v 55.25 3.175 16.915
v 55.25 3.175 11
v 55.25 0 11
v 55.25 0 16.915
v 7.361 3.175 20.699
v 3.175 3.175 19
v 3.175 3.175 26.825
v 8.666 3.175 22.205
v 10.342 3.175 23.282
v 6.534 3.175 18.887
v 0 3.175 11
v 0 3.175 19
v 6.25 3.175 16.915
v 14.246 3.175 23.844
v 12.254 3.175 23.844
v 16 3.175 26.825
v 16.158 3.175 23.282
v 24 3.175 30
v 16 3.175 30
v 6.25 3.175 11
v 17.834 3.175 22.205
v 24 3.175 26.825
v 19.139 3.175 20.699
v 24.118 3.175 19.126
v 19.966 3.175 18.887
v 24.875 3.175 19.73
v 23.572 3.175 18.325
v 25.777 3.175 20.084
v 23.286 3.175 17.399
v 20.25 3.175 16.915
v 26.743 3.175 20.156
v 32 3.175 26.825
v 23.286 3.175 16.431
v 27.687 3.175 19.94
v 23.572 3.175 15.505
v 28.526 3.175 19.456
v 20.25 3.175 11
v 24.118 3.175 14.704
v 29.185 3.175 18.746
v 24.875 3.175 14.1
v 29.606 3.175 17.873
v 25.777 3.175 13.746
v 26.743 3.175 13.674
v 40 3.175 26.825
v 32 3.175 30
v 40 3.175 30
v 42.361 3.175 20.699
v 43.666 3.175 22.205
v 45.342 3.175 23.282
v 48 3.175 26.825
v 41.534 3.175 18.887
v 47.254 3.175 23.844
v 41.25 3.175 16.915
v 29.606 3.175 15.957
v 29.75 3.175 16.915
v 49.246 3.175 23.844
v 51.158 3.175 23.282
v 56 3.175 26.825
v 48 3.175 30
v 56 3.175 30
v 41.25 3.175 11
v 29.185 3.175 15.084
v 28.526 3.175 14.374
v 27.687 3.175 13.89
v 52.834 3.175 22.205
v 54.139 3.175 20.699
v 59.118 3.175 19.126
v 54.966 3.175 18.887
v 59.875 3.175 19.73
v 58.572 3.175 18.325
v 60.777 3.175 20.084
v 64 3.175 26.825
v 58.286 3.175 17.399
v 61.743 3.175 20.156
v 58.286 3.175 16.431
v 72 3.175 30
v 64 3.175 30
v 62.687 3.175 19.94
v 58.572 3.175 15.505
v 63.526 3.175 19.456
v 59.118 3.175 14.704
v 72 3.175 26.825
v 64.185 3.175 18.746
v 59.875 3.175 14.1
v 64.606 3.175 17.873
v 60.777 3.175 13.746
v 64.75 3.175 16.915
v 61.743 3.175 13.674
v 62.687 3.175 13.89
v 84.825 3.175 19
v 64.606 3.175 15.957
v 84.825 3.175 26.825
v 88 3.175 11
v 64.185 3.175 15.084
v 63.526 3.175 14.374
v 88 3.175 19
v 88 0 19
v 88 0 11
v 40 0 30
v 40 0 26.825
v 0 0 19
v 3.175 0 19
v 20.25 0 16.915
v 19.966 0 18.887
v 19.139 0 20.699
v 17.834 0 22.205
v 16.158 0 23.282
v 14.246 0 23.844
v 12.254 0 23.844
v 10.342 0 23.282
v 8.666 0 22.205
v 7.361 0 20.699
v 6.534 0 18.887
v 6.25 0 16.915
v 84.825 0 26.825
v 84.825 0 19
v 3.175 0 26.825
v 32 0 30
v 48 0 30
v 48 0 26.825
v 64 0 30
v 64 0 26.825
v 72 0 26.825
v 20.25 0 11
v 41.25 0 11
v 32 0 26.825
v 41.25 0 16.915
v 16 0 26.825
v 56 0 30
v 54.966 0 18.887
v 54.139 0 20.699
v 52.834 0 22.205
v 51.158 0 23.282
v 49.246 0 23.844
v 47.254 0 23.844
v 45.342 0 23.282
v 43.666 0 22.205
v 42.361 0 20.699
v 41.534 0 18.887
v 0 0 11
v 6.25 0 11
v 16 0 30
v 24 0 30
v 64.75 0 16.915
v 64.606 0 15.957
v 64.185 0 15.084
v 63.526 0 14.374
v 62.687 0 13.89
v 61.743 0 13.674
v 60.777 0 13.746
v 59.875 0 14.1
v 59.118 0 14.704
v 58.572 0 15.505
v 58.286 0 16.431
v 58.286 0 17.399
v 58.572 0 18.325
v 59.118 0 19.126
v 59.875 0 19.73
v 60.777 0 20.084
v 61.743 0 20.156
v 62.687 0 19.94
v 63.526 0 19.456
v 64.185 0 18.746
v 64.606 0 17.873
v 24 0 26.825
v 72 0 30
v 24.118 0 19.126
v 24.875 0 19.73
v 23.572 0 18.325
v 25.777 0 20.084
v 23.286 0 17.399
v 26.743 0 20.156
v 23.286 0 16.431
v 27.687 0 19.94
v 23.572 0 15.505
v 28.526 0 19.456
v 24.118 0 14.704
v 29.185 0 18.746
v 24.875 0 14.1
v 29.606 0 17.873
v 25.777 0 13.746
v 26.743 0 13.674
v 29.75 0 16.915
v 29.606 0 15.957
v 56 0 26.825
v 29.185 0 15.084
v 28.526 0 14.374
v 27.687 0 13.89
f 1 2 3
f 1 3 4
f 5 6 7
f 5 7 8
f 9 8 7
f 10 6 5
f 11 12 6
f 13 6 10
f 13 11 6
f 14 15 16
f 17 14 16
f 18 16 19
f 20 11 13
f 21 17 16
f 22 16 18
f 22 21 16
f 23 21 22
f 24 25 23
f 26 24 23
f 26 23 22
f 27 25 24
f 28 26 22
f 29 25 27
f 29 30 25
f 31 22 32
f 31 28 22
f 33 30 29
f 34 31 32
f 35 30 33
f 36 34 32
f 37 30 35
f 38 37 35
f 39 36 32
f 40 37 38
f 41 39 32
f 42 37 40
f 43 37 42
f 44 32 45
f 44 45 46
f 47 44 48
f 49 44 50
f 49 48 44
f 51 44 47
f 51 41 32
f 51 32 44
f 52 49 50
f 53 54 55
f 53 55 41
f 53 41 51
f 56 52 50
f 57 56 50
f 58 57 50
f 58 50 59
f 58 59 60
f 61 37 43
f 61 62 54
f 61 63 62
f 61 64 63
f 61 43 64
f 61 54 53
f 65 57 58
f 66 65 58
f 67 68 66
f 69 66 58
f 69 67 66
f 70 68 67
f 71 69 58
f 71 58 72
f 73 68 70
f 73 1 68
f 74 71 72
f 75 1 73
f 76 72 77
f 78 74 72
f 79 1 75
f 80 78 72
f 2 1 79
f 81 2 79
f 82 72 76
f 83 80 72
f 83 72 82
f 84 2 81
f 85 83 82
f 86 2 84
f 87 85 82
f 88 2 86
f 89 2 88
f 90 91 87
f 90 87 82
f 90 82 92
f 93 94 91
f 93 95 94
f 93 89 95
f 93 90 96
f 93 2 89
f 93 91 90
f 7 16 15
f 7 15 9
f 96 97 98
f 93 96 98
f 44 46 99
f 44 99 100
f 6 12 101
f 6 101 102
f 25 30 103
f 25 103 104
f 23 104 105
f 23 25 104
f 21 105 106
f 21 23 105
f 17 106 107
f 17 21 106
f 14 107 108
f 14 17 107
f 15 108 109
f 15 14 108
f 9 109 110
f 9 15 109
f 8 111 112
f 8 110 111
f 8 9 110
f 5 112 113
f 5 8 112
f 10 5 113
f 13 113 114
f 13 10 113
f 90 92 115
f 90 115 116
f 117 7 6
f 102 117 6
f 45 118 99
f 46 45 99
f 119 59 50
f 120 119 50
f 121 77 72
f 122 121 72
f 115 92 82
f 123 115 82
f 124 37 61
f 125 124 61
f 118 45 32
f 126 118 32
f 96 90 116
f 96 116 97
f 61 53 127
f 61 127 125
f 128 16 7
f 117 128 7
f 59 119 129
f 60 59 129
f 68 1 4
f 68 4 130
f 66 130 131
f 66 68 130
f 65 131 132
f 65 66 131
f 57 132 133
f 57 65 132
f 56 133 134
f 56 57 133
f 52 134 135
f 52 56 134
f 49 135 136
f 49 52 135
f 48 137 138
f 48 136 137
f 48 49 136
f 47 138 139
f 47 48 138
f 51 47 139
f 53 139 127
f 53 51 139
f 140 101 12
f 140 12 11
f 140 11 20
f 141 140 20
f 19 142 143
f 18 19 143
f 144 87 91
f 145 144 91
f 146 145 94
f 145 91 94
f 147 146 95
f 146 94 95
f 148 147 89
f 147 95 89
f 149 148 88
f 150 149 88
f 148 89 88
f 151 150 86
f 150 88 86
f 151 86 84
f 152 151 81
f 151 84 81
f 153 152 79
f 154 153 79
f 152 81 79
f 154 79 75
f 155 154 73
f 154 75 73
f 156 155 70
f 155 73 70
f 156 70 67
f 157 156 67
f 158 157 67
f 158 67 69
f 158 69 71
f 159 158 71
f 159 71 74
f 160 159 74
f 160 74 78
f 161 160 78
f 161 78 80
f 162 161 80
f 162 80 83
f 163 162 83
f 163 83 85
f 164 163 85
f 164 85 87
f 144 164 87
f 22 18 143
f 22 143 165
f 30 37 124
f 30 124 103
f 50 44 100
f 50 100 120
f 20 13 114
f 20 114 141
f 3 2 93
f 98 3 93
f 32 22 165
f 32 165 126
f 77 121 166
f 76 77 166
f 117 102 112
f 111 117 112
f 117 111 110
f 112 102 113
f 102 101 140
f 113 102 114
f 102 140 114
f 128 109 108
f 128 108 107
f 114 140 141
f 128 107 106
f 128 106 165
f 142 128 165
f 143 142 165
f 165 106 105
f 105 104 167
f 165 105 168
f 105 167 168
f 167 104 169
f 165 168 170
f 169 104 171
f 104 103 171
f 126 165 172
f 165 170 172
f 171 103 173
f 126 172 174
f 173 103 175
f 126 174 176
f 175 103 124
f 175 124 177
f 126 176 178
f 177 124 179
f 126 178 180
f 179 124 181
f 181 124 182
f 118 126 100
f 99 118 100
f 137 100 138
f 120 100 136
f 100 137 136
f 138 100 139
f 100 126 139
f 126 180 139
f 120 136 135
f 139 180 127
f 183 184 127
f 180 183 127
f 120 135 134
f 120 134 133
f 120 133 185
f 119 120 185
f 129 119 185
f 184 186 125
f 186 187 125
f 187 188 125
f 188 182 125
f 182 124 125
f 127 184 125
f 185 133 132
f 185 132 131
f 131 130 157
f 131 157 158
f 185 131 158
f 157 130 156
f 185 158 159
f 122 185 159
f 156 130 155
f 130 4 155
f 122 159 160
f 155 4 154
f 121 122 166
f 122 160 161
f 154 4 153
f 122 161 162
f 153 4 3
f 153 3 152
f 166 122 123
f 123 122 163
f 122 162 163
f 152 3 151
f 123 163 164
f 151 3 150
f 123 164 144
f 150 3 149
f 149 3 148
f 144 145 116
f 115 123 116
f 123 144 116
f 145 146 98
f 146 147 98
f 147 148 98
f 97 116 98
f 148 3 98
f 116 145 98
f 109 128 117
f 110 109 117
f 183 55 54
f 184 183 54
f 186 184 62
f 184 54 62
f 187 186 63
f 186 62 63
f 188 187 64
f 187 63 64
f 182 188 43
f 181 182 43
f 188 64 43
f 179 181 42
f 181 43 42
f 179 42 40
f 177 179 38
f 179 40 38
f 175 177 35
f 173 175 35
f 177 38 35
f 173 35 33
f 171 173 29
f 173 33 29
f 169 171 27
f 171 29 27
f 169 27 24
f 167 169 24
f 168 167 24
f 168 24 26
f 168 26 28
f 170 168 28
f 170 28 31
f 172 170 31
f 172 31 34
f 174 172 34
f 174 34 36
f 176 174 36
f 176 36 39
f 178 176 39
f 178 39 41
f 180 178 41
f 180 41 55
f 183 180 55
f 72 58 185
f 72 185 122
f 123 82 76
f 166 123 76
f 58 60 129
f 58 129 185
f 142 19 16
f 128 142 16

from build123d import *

# Parameters (mm, degrees)
SKETCH3_W           = 88
SKETCH3_H           = 30
BOSS_EXTRUDE1_DEPTH = 3.175
CUT_EXTRUDE1_REACH  = 5.175
SKETCH4_W           = 3.175
SKETCH4_H           = 7.825
SKETCH4_W_2         = 8
SKETCH4_H_2         = 3.175
SKETCH4_H_3         = 11
CUT_EXTRUDE2_REACH  = 5.175
SKETCH5_R           = 3.25
CUT_EXTRUDE3_REACH  = 5.175
SKETCH6_W           = 81.65
SKETCH6_H           = 11
CUT_EXTRUDE4_REACH  = 5.175


with BuildPart() as part:
    # Sketch3 → Boss-Extrude1 (new body)
    with BuildSketch(Plane(origin=(0, 0, 0), x_dir=(1, 0, 0), z_dir=(0, 1, 0))):
        with Locations((44, -15)):
            Rectangle(SKETCH3_W, SKETCH3_H)
    extrude(amount=BOSS_EXTRUDE1_DEPTH)

    # Sketch4 → Cut-Extrude1 (cut, up to next)
    with BuildSketch(Plane(origin=(0, 3.175, 0), x_dir=(1, 0, 0), z_dir=(0, 1, 0)), mode=Mode.PRIVATE) as cut_extrude1_sk1:
        with Locations((1.5875, -22.9125)):
            Rectangle(SKETCH4_W, SKETCH4_H)
    cut_extrude1_tool1 = extrude(cut_extrude1_sk1.sketch, amount=-CUT_EXTRUDE1_REACH, mode=Mode.PRIVATE) & part.part
    add(cut_extrude1_tool1.solids().sort_by_distance((1.5875, 3.175, 22.9125))[0], mode=Mode.SUBTRACT)
    # Sketch4 → Cut-Extrude1 (cut, up to next)
    with BuildSketch(Plane(origin=(0, 3.175, 0), x_dir=(1, 0, 0), z_dir=(0, 1, 0)), mode=Mode.PRIVATE) as cut_extrude1_sk2:
        Polygon((0, -30), (16, -30), (16, -26.825), (3.175, -26.825), (0, -26.825), align=None)
    cut_extrude1_tool2 = extrude(cut_extrude1_sk2.sketch, amount=-CUT_EXTRUDE1_REACH, mode=Mode.PRIVATE) & part.part
    add(cut_extrude1_tool2.solids().sort_by_distance((8, 3.175, 28.4125))[0], mode=Mode.SUBTRACT)
    # Sketch4 → Cut-Extrude1 (cut, up to next)
    with BuildSketch(Plane(origin=(0, 3.175, 0), x_dir=(1, 0, 0), z_dir=(0, 1, 0)), mode=Mode.PRIVATE) as cut_extrude1_sk3:
        with Locations((28, -28.4125)):
            Rectangle(SKETCH4_W_2, SKETCH4_H_2)
    cut_extrude1_tool3 = extrude(cut_extrude1_sk3.sketch, amount=-CUT_EXTRUDE1_REACH, mode=Mode.PRIVATE) & part.part
    add(cut_extrude1_tool3.solids().sort_by_distance((28, 3.175, 28.4125))[0], mode=Mode.SUBTRACT)
    # Sketch4 → Cut-Extrude1 (cut, up to next)
    with BuildSketch(Plane(origin=(0, 3.175, 0), x_dir=(1, 0, 0), z_dir=(0, 1, 0)), mode=Mode.PRIVATE) as cut_extrude1_sk4:
        with Locations((44, -28.4125)):
            Rectangle(SKETCH4_W_2, SKETCH4_H_2)
    cut_extrude1_tool4 = extrude(cut_extrude1_sk4.sketch, amount=-CUT_EXTRUDE1_REACH, mode=Mode.PRIVATE) & part.part
    add(cut_extrude1_tool4.solids().sort_by_distance((44, 3.175, 28.4125))[0], mode=Mode.SUBTRACT)
    # Sketch4 → Cut-Extrude1 (cut, up to next)
    with BuildSketch(Plane(origin=(0, 3.175, 0), x_dir=(1, 0, 0), z_dir=(0, 1, 0)), mode=Mode.PRIVATE) as cut_extrude1_sk5:
        with Locations((60, -28.4125)):
            Rectangle(SKETCH4_W_2, SKETCH4_H_2)
    cut_extrude1_tool5 = extrude(cut_extrude1_sk5.sketch, amount=-CUT_EXTRUDE1_REACH, mode=Mode.PRIVATE) & part.part
    add(cut_extrude1_tool5.solids().sort_by_distance((60, 3.175, 28.4125))[0], mode=Mode.SUBTRACT)
    # Sketch4 → Cut-Extrude1 (cut, up to next)
    with BuildSketch(Plane(origin=(0, 3.175, 0), x_dir=(1, 0, 0), z_dir=(0, 1, 0)), mode=Mode.PRIVATE) as cut_extrude1_sk6:
        with Locations((86.4125, -22.9125)):
            Rectangle(SKETCH4_W, SKETCH4_H)
    cut_extrude1_tool6 = extrude(cut_extrude1_sk6.sketch, amount=-CUT_EXTRUDE1_REACH, mode=Mode.PRIVATE) & part.part
    add(cut_extrude1_tool6.solids().sort_by_distance((86.4125, 3.175, 22.9125))[0], mode=Mode.SUBTRACT)
    # Sketch4 → Cut-Extrude1 (cut, up to next)
    with BuildSketch(Plane(origin=(0, 3.175, 0), x_dir=(1, 0, 0), z_dir=(0, 1, 0)), mode=Mode.PRIVATE) as cut_extrude1_sk7:
        with Locations((86.4125, -5.5)):
            Rectangle(SKETCH4_W, SKETCH4_H_3)
    cut_extrude1_tool7 = extrude(cut_extrude1_sk7.sketch, amount=-CUT_EXTRUDE1_REACH, mode=Mode.PRIVATE) & part.part
    add(cut_extrude1_tool7.solids().sort_by_distance((86.4125, 3.175, 5.5))[0], mode=Mode.SUBTRACT)
    # Sketch4 → Cut-Extrude1 (cut, up to next)
    with BuildSketch(Plane(origin=(0, 3.175, 0), x_dir=(1, 0, 0), z_dir=(0, 1, 0)), mode=Mode.PRIVATE) as cut_extrude1_sk8:
        Polygon((72, -26.825), (72, -30), (88, -30), (88, -26.825), (84.825, -26.825), align=None)
    cut_extrude1_tool8 = extrude(cut_extrude1_sk8.sketch, amount=-CUT_EXTRUDE1_REACH, mode=Mode.PRIVATE) & part.part
    add(cut_extrude1_tool8.solids().sort_by_distance((80, 3.175, 28.4125))[0], mode=Mode.SUBTRACT)
    # Sketch4 → Cut-Extrude1 (cut, up to next)
    with BuildSketch(Plane(origin=(0, 3.175, 0), x_dir=(1, 0, 0), z_dir=(0, 1, 0)), mode=Mode.PRIVATE) as cut_extrude1_sk9:
        with Locations((1.5875, -5.5)):
            Rectangle(SKETCH4_W, SKETCH4_H_3)
    cut_extrude1_tool9 = extrude(cut_extrude1_sk9.sketch, amount=-CUT_EXTRUDE1_REACH, mode=Mode.PRIVATE) & part.part
    add(cut_extrude1_tool9.solids().sort_by_distance((1.5875, 3.175, 5.5))[0], mode=Mode.SUBTRACT)

    # Sketch5 → Cut-Extrude2 (cut, up to next)
    with BuildSketch(Plane(origin=(0, 3.175, 0), x_dir=(1, 0, 0), z_dir=(0, 1, 0)), mode=Mode.PRIVATE) as cut_extrude2_sk1:
        with Locations((61.5, -16.915)):
            Circle(SKETCH5_R)
    cut_extrude2_tool1 = extrude(cut_extrude2_sk1.sketch, amount=-CUT_EXTRUDE2_REACH, mode=Mode.PRIVATE) & part.part
    add(cut_extrude2_tool1.solids().sort_by_distance((61.5, 3.175, 16.915))[0], mode=Mode.SUBTRACT)
    # Sketch5 → Cut-Extrude2 (cut, up to next)
    with BuildSketch(Plane(origin=(0, 3.175, 0), x_dir=(1, 0, 0), z_dir=(0, 1, 0)), mode=Mode.PRIVATE) as cut_extrude2_sk2:
        with Locations((26.5, -16.915)):
            Circle(SKETCH5_R)
    cut_extrude2_tool2 = extrude(cut_extrude2_sk2.sketch, amount=-CUT_EXTRUDE2_REACH, mode=Mode.PRIVATE) & part.part
    add(cut_extrude2_tool2.solids().sort_by_distance((26.5, 3.175, 16.915))[0], mode=Mode.SUBTRACT)

    # Sketch6 → Cut-Extrude3 (cut, up to next)
    with BuildSketch(Plane(origin=(0, 3.175, 0), x_dir=(1, 0, 0), z_dir=(0, 1, 0)), mode=Mode.PRIVATE) as cut_extrude3_sk1:
        with Locations((44, -5.5)):
            Rectangle(SKETCH6_W, SKETCH6_H)
    cut_extrude3_tool1 = extrude(cut_extrude3_sk1.sketch, amount=-CUT_EXTRUDE3_REACH, mode=Mode.PRIVATE) & part.part
    add(cut_extrude3_tool1.solids().sort_by_distance((44, 3.175, 5.5))[0], mode=Mode.SUBTRACT)

    # Sketch7 → Cut-Extrude4 (cut, up to next)
    with BuildSketch(Plane(origin=(0, 3.175, 0), x_dir=(1, 0, 0), z_dir=(0, 1, 0)), mode=Mode.PRIVATE) as cut_extrude4_sk1:
        with BuildLine():
            Line((6.25, -16.915), (6.25, -11))
            Line((6.25, -11), (20.25, -11))
            Line((20.25, -11), (20.25, -16.915))
            ThreePointArc((20.25, -16.915), (13.25, -23.915), (6.25, -16.915))
        make_face()
    cut_extrude4_tool1 = extrude(cut_extrude4_sk1.sketch, amount=-CUT_EXTRUDE4_REACH, mode=Mode.PRIVATE) & part.part
    add(cut_extrude4_tool1.solids().sort_by_distance((13.25, 3.175, 16.813335))[0], mode=Mode.SUBTRACT)
    # Sketch7 → Cut-Extrude4 (cut, up to next)
    with BuildSketch(Plane(origin=(0, 3.175, 0), x_dir=(1, 0, 0), z_dir=(0, 1, 0)), mode=Mode.PRIVATE) as cut_extrude4_sk2:
        with BuildLine():
            Line((41.25, -16.915), (41.25, -11))
            Line((41.25, -11), (55.25, -11))
            Line((55.25, -11), (55.25, -16.915))
            ThreePointArc((55.25, -16.915), (48.25, -23.915), (41.25, -16.915))
        make_face()
    cut_extrude4_tool2 = extrude(cut_extrude4_sk2.sketch, amount=-CUT_EXTRUDE4_REACH, mode=Mode.PRIVATE) & part.part
    add(cut_extrude4_tool2.solids().sort_by_distance((48.25, 3.175, 16.813335))[0], mode=Mode.SUBTRACT)


solid = part.part
